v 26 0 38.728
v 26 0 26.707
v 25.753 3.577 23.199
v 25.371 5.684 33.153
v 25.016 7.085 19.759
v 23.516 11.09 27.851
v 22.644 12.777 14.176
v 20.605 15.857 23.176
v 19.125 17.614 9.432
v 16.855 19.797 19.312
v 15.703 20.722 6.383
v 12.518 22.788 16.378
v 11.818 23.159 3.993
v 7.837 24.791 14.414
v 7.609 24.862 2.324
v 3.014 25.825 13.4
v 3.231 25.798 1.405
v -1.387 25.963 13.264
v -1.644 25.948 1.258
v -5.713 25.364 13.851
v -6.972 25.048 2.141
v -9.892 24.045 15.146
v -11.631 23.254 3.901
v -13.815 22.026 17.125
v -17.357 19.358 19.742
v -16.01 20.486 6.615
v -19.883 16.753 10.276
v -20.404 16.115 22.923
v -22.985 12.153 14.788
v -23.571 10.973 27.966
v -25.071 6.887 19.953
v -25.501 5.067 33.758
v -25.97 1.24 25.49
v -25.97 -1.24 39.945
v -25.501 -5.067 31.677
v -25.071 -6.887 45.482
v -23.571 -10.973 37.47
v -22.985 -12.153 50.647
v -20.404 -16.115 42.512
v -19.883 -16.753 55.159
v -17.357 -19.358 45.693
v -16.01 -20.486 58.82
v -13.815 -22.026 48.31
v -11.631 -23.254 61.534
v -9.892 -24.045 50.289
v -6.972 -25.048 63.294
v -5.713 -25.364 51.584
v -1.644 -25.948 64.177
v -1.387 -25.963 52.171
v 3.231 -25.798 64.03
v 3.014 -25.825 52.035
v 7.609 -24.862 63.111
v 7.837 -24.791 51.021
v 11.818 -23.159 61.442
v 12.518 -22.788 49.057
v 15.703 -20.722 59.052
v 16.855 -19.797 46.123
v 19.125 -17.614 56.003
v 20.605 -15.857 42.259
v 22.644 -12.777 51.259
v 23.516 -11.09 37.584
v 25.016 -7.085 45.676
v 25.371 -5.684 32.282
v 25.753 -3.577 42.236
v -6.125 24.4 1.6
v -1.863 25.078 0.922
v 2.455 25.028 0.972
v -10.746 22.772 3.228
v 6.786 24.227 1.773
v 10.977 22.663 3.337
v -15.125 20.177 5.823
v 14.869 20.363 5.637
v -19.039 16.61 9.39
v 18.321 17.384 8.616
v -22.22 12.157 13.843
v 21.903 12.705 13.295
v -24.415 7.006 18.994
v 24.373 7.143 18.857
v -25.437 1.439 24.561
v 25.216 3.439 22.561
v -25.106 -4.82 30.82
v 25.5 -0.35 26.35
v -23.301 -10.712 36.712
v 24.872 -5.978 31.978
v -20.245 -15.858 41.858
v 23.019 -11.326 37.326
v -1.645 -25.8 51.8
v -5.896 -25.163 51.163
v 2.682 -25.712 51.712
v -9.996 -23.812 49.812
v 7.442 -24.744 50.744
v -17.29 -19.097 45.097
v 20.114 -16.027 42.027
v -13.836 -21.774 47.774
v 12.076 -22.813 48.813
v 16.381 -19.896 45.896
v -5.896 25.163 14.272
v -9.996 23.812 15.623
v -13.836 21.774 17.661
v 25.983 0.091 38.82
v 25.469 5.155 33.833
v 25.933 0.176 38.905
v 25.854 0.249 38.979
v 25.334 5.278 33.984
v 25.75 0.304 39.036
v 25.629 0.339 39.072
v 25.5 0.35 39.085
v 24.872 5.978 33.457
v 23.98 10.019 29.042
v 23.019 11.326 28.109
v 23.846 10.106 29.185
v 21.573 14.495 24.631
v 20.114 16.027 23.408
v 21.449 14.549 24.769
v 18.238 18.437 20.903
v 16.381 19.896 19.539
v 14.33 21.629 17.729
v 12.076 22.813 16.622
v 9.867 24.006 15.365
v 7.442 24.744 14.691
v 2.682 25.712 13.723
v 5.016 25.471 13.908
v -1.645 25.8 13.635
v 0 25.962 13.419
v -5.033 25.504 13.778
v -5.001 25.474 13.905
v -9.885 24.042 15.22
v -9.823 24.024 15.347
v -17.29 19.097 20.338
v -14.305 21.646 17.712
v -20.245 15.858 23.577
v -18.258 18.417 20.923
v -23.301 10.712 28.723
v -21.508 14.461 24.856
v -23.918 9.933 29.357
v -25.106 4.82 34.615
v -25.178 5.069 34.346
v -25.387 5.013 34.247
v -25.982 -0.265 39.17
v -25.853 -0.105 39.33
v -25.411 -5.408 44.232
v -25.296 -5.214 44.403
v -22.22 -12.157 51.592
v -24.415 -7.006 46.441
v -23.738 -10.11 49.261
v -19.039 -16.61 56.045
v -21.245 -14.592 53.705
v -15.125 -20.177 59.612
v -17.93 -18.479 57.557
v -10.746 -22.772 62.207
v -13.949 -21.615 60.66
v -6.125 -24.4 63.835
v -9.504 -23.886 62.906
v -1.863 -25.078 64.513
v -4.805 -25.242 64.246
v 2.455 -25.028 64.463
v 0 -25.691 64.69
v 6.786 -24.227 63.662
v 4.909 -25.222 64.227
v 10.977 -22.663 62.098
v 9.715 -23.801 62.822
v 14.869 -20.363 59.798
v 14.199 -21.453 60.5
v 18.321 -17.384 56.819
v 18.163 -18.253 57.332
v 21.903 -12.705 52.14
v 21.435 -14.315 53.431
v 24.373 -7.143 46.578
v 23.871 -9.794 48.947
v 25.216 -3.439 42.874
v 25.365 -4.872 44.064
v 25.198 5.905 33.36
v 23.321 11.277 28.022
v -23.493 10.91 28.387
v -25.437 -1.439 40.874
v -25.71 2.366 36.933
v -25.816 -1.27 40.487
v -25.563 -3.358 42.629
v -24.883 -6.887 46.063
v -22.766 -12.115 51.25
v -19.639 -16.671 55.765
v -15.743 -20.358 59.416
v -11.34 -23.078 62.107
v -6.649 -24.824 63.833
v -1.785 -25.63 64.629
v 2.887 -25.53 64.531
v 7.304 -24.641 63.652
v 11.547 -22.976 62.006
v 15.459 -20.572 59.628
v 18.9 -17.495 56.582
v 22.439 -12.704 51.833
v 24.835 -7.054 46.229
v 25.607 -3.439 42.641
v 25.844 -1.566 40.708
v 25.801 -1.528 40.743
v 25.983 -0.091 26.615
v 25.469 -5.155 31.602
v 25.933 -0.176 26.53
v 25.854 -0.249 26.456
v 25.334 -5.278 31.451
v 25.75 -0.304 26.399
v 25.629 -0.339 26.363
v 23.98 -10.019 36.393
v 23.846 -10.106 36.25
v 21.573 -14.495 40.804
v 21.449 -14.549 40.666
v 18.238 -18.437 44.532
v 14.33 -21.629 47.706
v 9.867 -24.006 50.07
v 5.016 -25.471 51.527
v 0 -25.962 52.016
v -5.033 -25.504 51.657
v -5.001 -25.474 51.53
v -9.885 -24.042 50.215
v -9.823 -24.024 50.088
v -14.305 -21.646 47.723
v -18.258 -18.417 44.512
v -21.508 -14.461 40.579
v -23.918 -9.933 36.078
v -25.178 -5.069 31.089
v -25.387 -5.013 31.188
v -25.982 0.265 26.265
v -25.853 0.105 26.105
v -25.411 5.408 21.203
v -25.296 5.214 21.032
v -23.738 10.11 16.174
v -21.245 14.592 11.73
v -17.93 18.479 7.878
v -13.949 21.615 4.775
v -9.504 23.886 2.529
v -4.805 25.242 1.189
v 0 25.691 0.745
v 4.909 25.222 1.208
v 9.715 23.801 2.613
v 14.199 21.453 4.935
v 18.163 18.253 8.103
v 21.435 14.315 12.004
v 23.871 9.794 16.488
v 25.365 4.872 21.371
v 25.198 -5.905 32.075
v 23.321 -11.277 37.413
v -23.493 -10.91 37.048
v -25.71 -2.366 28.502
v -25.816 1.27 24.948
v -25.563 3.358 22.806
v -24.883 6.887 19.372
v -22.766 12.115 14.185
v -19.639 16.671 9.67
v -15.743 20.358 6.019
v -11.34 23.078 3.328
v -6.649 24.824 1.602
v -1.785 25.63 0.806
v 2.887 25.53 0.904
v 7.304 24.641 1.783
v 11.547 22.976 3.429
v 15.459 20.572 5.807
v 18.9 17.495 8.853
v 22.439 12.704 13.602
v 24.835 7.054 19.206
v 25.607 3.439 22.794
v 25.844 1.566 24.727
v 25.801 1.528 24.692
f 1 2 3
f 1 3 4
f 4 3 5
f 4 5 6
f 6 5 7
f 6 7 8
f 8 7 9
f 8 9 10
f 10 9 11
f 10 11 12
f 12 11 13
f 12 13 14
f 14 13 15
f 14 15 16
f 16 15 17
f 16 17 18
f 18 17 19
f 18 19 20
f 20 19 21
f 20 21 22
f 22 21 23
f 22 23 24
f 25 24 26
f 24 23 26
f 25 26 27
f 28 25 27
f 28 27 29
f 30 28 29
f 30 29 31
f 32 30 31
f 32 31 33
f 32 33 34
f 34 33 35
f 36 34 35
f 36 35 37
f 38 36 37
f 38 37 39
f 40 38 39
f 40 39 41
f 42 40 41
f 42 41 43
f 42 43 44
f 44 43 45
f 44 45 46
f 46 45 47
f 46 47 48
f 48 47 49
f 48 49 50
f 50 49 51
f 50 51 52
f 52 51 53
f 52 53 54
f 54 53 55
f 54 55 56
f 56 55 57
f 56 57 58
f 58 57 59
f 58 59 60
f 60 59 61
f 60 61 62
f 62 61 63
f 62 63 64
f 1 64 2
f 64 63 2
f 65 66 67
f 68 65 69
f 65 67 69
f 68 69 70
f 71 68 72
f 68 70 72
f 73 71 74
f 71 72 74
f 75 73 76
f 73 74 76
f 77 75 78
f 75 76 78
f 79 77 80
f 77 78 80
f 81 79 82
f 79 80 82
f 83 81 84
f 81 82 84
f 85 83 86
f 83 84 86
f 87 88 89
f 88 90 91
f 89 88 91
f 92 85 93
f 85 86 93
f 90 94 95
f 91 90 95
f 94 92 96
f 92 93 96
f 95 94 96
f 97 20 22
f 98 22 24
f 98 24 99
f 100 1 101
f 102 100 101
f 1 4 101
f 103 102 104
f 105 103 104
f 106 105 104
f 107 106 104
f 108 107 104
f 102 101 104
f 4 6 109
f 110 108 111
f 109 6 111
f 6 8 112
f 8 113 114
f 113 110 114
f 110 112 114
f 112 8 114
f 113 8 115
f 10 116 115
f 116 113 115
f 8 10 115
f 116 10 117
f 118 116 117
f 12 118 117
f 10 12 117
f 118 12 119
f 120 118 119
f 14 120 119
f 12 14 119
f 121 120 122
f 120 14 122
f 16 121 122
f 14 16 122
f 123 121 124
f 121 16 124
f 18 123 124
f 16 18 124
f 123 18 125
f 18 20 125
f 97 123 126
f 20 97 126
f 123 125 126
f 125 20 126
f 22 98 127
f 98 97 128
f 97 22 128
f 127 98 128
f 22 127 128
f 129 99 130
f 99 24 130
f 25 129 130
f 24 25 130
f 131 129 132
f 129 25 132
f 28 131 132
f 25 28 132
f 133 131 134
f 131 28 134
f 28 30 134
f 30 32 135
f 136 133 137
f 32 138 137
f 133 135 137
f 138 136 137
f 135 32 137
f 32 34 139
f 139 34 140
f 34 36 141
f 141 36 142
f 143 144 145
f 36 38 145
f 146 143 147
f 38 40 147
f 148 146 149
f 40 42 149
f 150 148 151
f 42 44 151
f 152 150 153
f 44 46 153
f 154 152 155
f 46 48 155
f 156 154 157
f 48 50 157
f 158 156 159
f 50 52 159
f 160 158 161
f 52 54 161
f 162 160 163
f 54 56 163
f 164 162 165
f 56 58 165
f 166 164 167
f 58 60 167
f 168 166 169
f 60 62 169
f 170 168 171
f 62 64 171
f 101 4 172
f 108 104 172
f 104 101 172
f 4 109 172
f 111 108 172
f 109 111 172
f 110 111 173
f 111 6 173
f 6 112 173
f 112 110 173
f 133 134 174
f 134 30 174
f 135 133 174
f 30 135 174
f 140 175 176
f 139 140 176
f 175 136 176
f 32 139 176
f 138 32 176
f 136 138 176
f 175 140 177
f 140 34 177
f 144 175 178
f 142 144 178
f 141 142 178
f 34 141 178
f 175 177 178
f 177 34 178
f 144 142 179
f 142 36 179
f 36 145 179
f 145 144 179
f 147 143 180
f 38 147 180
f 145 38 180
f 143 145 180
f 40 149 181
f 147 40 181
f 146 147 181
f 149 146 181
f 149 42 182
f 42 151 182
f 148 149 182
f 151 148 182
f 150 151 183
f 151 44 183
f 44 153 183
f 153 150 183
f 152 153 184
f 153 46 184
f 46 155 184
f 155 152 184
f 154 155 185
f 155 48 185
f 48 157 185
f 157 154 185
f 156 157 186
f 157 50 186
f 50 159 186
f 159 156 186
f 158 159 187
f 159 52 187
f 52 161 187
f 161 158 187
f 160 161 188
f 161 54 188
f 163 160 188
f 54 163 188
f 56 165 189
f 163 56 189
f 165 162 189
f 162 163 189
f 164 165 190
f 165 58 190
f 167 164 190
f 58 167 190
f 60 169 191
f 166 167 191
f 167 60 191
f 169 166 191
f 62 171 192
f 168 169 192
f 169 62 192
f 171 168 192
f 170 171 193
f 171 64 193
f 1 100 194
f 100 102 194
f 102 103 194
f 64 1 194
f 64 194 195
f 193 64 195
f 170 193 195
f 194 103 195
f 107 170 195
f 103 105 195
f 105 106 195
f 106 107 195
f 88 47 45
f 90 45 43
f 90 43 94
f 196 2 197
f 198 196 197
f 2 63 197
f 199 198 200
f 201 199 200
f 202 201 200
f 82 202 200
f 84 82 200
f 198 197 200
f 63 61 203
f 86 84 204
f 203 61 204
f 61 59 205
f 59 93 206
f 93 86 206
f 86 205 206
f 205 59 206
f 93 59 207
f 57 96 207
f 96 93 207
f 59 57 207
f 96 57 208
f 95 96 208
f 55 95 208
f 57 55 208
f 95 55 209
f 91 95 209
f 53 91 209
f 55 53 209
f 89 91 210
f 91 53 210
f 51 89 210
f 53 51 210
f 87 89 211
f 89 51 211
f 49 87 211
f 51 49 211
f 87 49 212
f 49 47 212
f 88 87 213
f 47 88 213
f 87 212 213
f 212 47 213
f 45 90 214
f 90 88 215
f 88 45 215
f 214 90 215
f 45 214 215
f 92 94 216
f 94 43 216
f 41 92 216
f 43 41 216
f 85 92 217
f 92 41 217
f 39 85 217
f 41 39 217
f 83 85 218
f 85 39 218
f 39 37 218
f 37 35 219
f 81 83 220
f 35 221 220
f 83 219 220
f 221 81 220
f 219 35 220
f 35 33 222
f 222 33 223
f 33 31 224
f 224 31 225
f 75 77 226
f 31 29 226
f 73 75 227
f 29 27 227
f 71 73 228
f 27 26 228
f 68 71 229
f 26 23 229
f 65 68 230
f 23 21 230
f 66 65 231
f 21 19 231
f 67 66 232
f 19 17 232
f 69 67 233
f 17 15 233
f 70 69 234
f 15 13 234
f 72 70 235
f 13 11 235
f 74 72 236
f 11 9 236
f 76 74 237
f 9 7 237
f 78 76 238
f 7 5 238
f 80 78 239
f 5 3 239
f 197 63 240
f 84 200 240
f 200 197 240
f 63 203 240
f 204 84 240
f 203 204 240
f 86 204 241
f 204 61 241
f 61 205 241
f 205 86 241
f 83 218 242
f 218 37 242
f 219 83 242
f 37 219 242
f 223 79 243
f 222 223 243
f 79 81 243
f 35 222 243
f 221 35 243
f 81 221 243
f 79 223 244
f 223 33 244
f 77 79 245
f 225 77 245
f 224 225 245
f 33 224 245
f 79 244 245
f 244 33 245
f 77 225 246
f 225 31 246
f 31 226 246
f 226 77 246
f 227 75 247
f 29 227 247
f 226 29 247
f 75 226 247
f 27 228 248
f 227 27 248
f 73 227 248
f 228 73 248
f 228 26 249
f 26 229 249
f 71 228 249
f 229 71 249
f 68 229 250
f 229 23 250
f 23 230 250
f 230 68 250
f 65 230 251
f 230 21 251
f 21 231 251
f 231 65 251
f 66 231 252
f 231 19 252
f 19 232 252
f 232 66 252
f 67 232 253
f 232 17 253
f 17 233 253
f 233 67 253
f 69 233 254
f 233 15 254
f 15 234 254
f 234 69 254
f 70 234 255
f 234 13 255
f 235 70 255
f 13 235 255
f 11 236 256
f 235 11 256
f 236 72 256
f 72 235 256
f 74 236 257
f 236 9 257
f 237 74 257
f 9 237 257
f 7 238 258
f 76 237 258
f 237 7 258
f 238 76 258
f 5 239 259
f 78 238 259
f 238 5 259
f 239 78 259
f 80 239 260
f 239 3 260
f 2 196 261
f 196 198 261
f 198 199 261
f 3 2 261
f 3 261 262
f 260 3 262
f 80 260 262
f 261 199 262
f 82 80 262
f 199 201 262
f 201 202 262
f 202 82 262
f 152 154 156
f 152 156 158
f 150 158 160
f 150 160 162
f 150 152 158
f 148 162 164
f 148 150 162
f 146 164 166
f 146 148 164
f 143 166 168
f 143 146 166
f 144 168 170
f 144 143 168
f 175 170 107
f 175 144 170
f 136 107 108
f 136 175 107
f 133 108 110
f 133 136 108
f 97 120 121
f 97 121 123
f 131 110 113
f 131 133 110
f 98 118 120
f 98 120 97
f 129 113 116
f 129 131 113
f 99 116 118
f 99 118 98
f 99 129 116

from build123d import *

# Parameters (mm, degrees)
SKETCH1_R               = 26
BOSS_EXTRUDE1_DEPTH     = 70
CUT_EXTRUDE1_DEPTH      = 27
CUT_EXTRUDE1_DEPTH_BACK = 27
FILLET1_R               = 0.5


with BuildPart() as part:
    # Sketch1 → Boss-Extrude1 (new body)
    with BuildSketch(Plane.XY):
        Circle(SKETCH1_R)
    extrude(amount=BOSS_EXTRUDE1_DEPTH)

    # Sketch2 → Cut-Extrude1 (cut, two sides)
    with BuildSketch(Plane(origin=(0, 0, 0), x_dir=(0, 0, -1), z_dir=(1, 0, 0))) as cut_extrude1_sk:
        Polygon((0, 26), (-52, -26), (0, -26), align=None)
        Polygon((-65.435028843, -26), (-13.435028843, 26), (-70, 26), (-70, -26), align=None)
    extrude(amount=CUT_EXTRUDE1_DEPTH, mode=Mode.SUBTRACT)
    extrude(cut_extrude1_sk.sketch, amount=-CUT_EXTRUDE1_DEPTH_BACK, mode=Mode.SUBTRACT)

    # Fillet1
    fillet1_edges = [part.edges().sort_by_distance(p)[0] for p in [
        (19.845696436, -16.797271593, 42.797271593),
        (19.845696436, 16.797271593, 22.63775725),
    ]]
    fillet(fillet1_edges, radius=FILLET1_R)


solid = part.part
